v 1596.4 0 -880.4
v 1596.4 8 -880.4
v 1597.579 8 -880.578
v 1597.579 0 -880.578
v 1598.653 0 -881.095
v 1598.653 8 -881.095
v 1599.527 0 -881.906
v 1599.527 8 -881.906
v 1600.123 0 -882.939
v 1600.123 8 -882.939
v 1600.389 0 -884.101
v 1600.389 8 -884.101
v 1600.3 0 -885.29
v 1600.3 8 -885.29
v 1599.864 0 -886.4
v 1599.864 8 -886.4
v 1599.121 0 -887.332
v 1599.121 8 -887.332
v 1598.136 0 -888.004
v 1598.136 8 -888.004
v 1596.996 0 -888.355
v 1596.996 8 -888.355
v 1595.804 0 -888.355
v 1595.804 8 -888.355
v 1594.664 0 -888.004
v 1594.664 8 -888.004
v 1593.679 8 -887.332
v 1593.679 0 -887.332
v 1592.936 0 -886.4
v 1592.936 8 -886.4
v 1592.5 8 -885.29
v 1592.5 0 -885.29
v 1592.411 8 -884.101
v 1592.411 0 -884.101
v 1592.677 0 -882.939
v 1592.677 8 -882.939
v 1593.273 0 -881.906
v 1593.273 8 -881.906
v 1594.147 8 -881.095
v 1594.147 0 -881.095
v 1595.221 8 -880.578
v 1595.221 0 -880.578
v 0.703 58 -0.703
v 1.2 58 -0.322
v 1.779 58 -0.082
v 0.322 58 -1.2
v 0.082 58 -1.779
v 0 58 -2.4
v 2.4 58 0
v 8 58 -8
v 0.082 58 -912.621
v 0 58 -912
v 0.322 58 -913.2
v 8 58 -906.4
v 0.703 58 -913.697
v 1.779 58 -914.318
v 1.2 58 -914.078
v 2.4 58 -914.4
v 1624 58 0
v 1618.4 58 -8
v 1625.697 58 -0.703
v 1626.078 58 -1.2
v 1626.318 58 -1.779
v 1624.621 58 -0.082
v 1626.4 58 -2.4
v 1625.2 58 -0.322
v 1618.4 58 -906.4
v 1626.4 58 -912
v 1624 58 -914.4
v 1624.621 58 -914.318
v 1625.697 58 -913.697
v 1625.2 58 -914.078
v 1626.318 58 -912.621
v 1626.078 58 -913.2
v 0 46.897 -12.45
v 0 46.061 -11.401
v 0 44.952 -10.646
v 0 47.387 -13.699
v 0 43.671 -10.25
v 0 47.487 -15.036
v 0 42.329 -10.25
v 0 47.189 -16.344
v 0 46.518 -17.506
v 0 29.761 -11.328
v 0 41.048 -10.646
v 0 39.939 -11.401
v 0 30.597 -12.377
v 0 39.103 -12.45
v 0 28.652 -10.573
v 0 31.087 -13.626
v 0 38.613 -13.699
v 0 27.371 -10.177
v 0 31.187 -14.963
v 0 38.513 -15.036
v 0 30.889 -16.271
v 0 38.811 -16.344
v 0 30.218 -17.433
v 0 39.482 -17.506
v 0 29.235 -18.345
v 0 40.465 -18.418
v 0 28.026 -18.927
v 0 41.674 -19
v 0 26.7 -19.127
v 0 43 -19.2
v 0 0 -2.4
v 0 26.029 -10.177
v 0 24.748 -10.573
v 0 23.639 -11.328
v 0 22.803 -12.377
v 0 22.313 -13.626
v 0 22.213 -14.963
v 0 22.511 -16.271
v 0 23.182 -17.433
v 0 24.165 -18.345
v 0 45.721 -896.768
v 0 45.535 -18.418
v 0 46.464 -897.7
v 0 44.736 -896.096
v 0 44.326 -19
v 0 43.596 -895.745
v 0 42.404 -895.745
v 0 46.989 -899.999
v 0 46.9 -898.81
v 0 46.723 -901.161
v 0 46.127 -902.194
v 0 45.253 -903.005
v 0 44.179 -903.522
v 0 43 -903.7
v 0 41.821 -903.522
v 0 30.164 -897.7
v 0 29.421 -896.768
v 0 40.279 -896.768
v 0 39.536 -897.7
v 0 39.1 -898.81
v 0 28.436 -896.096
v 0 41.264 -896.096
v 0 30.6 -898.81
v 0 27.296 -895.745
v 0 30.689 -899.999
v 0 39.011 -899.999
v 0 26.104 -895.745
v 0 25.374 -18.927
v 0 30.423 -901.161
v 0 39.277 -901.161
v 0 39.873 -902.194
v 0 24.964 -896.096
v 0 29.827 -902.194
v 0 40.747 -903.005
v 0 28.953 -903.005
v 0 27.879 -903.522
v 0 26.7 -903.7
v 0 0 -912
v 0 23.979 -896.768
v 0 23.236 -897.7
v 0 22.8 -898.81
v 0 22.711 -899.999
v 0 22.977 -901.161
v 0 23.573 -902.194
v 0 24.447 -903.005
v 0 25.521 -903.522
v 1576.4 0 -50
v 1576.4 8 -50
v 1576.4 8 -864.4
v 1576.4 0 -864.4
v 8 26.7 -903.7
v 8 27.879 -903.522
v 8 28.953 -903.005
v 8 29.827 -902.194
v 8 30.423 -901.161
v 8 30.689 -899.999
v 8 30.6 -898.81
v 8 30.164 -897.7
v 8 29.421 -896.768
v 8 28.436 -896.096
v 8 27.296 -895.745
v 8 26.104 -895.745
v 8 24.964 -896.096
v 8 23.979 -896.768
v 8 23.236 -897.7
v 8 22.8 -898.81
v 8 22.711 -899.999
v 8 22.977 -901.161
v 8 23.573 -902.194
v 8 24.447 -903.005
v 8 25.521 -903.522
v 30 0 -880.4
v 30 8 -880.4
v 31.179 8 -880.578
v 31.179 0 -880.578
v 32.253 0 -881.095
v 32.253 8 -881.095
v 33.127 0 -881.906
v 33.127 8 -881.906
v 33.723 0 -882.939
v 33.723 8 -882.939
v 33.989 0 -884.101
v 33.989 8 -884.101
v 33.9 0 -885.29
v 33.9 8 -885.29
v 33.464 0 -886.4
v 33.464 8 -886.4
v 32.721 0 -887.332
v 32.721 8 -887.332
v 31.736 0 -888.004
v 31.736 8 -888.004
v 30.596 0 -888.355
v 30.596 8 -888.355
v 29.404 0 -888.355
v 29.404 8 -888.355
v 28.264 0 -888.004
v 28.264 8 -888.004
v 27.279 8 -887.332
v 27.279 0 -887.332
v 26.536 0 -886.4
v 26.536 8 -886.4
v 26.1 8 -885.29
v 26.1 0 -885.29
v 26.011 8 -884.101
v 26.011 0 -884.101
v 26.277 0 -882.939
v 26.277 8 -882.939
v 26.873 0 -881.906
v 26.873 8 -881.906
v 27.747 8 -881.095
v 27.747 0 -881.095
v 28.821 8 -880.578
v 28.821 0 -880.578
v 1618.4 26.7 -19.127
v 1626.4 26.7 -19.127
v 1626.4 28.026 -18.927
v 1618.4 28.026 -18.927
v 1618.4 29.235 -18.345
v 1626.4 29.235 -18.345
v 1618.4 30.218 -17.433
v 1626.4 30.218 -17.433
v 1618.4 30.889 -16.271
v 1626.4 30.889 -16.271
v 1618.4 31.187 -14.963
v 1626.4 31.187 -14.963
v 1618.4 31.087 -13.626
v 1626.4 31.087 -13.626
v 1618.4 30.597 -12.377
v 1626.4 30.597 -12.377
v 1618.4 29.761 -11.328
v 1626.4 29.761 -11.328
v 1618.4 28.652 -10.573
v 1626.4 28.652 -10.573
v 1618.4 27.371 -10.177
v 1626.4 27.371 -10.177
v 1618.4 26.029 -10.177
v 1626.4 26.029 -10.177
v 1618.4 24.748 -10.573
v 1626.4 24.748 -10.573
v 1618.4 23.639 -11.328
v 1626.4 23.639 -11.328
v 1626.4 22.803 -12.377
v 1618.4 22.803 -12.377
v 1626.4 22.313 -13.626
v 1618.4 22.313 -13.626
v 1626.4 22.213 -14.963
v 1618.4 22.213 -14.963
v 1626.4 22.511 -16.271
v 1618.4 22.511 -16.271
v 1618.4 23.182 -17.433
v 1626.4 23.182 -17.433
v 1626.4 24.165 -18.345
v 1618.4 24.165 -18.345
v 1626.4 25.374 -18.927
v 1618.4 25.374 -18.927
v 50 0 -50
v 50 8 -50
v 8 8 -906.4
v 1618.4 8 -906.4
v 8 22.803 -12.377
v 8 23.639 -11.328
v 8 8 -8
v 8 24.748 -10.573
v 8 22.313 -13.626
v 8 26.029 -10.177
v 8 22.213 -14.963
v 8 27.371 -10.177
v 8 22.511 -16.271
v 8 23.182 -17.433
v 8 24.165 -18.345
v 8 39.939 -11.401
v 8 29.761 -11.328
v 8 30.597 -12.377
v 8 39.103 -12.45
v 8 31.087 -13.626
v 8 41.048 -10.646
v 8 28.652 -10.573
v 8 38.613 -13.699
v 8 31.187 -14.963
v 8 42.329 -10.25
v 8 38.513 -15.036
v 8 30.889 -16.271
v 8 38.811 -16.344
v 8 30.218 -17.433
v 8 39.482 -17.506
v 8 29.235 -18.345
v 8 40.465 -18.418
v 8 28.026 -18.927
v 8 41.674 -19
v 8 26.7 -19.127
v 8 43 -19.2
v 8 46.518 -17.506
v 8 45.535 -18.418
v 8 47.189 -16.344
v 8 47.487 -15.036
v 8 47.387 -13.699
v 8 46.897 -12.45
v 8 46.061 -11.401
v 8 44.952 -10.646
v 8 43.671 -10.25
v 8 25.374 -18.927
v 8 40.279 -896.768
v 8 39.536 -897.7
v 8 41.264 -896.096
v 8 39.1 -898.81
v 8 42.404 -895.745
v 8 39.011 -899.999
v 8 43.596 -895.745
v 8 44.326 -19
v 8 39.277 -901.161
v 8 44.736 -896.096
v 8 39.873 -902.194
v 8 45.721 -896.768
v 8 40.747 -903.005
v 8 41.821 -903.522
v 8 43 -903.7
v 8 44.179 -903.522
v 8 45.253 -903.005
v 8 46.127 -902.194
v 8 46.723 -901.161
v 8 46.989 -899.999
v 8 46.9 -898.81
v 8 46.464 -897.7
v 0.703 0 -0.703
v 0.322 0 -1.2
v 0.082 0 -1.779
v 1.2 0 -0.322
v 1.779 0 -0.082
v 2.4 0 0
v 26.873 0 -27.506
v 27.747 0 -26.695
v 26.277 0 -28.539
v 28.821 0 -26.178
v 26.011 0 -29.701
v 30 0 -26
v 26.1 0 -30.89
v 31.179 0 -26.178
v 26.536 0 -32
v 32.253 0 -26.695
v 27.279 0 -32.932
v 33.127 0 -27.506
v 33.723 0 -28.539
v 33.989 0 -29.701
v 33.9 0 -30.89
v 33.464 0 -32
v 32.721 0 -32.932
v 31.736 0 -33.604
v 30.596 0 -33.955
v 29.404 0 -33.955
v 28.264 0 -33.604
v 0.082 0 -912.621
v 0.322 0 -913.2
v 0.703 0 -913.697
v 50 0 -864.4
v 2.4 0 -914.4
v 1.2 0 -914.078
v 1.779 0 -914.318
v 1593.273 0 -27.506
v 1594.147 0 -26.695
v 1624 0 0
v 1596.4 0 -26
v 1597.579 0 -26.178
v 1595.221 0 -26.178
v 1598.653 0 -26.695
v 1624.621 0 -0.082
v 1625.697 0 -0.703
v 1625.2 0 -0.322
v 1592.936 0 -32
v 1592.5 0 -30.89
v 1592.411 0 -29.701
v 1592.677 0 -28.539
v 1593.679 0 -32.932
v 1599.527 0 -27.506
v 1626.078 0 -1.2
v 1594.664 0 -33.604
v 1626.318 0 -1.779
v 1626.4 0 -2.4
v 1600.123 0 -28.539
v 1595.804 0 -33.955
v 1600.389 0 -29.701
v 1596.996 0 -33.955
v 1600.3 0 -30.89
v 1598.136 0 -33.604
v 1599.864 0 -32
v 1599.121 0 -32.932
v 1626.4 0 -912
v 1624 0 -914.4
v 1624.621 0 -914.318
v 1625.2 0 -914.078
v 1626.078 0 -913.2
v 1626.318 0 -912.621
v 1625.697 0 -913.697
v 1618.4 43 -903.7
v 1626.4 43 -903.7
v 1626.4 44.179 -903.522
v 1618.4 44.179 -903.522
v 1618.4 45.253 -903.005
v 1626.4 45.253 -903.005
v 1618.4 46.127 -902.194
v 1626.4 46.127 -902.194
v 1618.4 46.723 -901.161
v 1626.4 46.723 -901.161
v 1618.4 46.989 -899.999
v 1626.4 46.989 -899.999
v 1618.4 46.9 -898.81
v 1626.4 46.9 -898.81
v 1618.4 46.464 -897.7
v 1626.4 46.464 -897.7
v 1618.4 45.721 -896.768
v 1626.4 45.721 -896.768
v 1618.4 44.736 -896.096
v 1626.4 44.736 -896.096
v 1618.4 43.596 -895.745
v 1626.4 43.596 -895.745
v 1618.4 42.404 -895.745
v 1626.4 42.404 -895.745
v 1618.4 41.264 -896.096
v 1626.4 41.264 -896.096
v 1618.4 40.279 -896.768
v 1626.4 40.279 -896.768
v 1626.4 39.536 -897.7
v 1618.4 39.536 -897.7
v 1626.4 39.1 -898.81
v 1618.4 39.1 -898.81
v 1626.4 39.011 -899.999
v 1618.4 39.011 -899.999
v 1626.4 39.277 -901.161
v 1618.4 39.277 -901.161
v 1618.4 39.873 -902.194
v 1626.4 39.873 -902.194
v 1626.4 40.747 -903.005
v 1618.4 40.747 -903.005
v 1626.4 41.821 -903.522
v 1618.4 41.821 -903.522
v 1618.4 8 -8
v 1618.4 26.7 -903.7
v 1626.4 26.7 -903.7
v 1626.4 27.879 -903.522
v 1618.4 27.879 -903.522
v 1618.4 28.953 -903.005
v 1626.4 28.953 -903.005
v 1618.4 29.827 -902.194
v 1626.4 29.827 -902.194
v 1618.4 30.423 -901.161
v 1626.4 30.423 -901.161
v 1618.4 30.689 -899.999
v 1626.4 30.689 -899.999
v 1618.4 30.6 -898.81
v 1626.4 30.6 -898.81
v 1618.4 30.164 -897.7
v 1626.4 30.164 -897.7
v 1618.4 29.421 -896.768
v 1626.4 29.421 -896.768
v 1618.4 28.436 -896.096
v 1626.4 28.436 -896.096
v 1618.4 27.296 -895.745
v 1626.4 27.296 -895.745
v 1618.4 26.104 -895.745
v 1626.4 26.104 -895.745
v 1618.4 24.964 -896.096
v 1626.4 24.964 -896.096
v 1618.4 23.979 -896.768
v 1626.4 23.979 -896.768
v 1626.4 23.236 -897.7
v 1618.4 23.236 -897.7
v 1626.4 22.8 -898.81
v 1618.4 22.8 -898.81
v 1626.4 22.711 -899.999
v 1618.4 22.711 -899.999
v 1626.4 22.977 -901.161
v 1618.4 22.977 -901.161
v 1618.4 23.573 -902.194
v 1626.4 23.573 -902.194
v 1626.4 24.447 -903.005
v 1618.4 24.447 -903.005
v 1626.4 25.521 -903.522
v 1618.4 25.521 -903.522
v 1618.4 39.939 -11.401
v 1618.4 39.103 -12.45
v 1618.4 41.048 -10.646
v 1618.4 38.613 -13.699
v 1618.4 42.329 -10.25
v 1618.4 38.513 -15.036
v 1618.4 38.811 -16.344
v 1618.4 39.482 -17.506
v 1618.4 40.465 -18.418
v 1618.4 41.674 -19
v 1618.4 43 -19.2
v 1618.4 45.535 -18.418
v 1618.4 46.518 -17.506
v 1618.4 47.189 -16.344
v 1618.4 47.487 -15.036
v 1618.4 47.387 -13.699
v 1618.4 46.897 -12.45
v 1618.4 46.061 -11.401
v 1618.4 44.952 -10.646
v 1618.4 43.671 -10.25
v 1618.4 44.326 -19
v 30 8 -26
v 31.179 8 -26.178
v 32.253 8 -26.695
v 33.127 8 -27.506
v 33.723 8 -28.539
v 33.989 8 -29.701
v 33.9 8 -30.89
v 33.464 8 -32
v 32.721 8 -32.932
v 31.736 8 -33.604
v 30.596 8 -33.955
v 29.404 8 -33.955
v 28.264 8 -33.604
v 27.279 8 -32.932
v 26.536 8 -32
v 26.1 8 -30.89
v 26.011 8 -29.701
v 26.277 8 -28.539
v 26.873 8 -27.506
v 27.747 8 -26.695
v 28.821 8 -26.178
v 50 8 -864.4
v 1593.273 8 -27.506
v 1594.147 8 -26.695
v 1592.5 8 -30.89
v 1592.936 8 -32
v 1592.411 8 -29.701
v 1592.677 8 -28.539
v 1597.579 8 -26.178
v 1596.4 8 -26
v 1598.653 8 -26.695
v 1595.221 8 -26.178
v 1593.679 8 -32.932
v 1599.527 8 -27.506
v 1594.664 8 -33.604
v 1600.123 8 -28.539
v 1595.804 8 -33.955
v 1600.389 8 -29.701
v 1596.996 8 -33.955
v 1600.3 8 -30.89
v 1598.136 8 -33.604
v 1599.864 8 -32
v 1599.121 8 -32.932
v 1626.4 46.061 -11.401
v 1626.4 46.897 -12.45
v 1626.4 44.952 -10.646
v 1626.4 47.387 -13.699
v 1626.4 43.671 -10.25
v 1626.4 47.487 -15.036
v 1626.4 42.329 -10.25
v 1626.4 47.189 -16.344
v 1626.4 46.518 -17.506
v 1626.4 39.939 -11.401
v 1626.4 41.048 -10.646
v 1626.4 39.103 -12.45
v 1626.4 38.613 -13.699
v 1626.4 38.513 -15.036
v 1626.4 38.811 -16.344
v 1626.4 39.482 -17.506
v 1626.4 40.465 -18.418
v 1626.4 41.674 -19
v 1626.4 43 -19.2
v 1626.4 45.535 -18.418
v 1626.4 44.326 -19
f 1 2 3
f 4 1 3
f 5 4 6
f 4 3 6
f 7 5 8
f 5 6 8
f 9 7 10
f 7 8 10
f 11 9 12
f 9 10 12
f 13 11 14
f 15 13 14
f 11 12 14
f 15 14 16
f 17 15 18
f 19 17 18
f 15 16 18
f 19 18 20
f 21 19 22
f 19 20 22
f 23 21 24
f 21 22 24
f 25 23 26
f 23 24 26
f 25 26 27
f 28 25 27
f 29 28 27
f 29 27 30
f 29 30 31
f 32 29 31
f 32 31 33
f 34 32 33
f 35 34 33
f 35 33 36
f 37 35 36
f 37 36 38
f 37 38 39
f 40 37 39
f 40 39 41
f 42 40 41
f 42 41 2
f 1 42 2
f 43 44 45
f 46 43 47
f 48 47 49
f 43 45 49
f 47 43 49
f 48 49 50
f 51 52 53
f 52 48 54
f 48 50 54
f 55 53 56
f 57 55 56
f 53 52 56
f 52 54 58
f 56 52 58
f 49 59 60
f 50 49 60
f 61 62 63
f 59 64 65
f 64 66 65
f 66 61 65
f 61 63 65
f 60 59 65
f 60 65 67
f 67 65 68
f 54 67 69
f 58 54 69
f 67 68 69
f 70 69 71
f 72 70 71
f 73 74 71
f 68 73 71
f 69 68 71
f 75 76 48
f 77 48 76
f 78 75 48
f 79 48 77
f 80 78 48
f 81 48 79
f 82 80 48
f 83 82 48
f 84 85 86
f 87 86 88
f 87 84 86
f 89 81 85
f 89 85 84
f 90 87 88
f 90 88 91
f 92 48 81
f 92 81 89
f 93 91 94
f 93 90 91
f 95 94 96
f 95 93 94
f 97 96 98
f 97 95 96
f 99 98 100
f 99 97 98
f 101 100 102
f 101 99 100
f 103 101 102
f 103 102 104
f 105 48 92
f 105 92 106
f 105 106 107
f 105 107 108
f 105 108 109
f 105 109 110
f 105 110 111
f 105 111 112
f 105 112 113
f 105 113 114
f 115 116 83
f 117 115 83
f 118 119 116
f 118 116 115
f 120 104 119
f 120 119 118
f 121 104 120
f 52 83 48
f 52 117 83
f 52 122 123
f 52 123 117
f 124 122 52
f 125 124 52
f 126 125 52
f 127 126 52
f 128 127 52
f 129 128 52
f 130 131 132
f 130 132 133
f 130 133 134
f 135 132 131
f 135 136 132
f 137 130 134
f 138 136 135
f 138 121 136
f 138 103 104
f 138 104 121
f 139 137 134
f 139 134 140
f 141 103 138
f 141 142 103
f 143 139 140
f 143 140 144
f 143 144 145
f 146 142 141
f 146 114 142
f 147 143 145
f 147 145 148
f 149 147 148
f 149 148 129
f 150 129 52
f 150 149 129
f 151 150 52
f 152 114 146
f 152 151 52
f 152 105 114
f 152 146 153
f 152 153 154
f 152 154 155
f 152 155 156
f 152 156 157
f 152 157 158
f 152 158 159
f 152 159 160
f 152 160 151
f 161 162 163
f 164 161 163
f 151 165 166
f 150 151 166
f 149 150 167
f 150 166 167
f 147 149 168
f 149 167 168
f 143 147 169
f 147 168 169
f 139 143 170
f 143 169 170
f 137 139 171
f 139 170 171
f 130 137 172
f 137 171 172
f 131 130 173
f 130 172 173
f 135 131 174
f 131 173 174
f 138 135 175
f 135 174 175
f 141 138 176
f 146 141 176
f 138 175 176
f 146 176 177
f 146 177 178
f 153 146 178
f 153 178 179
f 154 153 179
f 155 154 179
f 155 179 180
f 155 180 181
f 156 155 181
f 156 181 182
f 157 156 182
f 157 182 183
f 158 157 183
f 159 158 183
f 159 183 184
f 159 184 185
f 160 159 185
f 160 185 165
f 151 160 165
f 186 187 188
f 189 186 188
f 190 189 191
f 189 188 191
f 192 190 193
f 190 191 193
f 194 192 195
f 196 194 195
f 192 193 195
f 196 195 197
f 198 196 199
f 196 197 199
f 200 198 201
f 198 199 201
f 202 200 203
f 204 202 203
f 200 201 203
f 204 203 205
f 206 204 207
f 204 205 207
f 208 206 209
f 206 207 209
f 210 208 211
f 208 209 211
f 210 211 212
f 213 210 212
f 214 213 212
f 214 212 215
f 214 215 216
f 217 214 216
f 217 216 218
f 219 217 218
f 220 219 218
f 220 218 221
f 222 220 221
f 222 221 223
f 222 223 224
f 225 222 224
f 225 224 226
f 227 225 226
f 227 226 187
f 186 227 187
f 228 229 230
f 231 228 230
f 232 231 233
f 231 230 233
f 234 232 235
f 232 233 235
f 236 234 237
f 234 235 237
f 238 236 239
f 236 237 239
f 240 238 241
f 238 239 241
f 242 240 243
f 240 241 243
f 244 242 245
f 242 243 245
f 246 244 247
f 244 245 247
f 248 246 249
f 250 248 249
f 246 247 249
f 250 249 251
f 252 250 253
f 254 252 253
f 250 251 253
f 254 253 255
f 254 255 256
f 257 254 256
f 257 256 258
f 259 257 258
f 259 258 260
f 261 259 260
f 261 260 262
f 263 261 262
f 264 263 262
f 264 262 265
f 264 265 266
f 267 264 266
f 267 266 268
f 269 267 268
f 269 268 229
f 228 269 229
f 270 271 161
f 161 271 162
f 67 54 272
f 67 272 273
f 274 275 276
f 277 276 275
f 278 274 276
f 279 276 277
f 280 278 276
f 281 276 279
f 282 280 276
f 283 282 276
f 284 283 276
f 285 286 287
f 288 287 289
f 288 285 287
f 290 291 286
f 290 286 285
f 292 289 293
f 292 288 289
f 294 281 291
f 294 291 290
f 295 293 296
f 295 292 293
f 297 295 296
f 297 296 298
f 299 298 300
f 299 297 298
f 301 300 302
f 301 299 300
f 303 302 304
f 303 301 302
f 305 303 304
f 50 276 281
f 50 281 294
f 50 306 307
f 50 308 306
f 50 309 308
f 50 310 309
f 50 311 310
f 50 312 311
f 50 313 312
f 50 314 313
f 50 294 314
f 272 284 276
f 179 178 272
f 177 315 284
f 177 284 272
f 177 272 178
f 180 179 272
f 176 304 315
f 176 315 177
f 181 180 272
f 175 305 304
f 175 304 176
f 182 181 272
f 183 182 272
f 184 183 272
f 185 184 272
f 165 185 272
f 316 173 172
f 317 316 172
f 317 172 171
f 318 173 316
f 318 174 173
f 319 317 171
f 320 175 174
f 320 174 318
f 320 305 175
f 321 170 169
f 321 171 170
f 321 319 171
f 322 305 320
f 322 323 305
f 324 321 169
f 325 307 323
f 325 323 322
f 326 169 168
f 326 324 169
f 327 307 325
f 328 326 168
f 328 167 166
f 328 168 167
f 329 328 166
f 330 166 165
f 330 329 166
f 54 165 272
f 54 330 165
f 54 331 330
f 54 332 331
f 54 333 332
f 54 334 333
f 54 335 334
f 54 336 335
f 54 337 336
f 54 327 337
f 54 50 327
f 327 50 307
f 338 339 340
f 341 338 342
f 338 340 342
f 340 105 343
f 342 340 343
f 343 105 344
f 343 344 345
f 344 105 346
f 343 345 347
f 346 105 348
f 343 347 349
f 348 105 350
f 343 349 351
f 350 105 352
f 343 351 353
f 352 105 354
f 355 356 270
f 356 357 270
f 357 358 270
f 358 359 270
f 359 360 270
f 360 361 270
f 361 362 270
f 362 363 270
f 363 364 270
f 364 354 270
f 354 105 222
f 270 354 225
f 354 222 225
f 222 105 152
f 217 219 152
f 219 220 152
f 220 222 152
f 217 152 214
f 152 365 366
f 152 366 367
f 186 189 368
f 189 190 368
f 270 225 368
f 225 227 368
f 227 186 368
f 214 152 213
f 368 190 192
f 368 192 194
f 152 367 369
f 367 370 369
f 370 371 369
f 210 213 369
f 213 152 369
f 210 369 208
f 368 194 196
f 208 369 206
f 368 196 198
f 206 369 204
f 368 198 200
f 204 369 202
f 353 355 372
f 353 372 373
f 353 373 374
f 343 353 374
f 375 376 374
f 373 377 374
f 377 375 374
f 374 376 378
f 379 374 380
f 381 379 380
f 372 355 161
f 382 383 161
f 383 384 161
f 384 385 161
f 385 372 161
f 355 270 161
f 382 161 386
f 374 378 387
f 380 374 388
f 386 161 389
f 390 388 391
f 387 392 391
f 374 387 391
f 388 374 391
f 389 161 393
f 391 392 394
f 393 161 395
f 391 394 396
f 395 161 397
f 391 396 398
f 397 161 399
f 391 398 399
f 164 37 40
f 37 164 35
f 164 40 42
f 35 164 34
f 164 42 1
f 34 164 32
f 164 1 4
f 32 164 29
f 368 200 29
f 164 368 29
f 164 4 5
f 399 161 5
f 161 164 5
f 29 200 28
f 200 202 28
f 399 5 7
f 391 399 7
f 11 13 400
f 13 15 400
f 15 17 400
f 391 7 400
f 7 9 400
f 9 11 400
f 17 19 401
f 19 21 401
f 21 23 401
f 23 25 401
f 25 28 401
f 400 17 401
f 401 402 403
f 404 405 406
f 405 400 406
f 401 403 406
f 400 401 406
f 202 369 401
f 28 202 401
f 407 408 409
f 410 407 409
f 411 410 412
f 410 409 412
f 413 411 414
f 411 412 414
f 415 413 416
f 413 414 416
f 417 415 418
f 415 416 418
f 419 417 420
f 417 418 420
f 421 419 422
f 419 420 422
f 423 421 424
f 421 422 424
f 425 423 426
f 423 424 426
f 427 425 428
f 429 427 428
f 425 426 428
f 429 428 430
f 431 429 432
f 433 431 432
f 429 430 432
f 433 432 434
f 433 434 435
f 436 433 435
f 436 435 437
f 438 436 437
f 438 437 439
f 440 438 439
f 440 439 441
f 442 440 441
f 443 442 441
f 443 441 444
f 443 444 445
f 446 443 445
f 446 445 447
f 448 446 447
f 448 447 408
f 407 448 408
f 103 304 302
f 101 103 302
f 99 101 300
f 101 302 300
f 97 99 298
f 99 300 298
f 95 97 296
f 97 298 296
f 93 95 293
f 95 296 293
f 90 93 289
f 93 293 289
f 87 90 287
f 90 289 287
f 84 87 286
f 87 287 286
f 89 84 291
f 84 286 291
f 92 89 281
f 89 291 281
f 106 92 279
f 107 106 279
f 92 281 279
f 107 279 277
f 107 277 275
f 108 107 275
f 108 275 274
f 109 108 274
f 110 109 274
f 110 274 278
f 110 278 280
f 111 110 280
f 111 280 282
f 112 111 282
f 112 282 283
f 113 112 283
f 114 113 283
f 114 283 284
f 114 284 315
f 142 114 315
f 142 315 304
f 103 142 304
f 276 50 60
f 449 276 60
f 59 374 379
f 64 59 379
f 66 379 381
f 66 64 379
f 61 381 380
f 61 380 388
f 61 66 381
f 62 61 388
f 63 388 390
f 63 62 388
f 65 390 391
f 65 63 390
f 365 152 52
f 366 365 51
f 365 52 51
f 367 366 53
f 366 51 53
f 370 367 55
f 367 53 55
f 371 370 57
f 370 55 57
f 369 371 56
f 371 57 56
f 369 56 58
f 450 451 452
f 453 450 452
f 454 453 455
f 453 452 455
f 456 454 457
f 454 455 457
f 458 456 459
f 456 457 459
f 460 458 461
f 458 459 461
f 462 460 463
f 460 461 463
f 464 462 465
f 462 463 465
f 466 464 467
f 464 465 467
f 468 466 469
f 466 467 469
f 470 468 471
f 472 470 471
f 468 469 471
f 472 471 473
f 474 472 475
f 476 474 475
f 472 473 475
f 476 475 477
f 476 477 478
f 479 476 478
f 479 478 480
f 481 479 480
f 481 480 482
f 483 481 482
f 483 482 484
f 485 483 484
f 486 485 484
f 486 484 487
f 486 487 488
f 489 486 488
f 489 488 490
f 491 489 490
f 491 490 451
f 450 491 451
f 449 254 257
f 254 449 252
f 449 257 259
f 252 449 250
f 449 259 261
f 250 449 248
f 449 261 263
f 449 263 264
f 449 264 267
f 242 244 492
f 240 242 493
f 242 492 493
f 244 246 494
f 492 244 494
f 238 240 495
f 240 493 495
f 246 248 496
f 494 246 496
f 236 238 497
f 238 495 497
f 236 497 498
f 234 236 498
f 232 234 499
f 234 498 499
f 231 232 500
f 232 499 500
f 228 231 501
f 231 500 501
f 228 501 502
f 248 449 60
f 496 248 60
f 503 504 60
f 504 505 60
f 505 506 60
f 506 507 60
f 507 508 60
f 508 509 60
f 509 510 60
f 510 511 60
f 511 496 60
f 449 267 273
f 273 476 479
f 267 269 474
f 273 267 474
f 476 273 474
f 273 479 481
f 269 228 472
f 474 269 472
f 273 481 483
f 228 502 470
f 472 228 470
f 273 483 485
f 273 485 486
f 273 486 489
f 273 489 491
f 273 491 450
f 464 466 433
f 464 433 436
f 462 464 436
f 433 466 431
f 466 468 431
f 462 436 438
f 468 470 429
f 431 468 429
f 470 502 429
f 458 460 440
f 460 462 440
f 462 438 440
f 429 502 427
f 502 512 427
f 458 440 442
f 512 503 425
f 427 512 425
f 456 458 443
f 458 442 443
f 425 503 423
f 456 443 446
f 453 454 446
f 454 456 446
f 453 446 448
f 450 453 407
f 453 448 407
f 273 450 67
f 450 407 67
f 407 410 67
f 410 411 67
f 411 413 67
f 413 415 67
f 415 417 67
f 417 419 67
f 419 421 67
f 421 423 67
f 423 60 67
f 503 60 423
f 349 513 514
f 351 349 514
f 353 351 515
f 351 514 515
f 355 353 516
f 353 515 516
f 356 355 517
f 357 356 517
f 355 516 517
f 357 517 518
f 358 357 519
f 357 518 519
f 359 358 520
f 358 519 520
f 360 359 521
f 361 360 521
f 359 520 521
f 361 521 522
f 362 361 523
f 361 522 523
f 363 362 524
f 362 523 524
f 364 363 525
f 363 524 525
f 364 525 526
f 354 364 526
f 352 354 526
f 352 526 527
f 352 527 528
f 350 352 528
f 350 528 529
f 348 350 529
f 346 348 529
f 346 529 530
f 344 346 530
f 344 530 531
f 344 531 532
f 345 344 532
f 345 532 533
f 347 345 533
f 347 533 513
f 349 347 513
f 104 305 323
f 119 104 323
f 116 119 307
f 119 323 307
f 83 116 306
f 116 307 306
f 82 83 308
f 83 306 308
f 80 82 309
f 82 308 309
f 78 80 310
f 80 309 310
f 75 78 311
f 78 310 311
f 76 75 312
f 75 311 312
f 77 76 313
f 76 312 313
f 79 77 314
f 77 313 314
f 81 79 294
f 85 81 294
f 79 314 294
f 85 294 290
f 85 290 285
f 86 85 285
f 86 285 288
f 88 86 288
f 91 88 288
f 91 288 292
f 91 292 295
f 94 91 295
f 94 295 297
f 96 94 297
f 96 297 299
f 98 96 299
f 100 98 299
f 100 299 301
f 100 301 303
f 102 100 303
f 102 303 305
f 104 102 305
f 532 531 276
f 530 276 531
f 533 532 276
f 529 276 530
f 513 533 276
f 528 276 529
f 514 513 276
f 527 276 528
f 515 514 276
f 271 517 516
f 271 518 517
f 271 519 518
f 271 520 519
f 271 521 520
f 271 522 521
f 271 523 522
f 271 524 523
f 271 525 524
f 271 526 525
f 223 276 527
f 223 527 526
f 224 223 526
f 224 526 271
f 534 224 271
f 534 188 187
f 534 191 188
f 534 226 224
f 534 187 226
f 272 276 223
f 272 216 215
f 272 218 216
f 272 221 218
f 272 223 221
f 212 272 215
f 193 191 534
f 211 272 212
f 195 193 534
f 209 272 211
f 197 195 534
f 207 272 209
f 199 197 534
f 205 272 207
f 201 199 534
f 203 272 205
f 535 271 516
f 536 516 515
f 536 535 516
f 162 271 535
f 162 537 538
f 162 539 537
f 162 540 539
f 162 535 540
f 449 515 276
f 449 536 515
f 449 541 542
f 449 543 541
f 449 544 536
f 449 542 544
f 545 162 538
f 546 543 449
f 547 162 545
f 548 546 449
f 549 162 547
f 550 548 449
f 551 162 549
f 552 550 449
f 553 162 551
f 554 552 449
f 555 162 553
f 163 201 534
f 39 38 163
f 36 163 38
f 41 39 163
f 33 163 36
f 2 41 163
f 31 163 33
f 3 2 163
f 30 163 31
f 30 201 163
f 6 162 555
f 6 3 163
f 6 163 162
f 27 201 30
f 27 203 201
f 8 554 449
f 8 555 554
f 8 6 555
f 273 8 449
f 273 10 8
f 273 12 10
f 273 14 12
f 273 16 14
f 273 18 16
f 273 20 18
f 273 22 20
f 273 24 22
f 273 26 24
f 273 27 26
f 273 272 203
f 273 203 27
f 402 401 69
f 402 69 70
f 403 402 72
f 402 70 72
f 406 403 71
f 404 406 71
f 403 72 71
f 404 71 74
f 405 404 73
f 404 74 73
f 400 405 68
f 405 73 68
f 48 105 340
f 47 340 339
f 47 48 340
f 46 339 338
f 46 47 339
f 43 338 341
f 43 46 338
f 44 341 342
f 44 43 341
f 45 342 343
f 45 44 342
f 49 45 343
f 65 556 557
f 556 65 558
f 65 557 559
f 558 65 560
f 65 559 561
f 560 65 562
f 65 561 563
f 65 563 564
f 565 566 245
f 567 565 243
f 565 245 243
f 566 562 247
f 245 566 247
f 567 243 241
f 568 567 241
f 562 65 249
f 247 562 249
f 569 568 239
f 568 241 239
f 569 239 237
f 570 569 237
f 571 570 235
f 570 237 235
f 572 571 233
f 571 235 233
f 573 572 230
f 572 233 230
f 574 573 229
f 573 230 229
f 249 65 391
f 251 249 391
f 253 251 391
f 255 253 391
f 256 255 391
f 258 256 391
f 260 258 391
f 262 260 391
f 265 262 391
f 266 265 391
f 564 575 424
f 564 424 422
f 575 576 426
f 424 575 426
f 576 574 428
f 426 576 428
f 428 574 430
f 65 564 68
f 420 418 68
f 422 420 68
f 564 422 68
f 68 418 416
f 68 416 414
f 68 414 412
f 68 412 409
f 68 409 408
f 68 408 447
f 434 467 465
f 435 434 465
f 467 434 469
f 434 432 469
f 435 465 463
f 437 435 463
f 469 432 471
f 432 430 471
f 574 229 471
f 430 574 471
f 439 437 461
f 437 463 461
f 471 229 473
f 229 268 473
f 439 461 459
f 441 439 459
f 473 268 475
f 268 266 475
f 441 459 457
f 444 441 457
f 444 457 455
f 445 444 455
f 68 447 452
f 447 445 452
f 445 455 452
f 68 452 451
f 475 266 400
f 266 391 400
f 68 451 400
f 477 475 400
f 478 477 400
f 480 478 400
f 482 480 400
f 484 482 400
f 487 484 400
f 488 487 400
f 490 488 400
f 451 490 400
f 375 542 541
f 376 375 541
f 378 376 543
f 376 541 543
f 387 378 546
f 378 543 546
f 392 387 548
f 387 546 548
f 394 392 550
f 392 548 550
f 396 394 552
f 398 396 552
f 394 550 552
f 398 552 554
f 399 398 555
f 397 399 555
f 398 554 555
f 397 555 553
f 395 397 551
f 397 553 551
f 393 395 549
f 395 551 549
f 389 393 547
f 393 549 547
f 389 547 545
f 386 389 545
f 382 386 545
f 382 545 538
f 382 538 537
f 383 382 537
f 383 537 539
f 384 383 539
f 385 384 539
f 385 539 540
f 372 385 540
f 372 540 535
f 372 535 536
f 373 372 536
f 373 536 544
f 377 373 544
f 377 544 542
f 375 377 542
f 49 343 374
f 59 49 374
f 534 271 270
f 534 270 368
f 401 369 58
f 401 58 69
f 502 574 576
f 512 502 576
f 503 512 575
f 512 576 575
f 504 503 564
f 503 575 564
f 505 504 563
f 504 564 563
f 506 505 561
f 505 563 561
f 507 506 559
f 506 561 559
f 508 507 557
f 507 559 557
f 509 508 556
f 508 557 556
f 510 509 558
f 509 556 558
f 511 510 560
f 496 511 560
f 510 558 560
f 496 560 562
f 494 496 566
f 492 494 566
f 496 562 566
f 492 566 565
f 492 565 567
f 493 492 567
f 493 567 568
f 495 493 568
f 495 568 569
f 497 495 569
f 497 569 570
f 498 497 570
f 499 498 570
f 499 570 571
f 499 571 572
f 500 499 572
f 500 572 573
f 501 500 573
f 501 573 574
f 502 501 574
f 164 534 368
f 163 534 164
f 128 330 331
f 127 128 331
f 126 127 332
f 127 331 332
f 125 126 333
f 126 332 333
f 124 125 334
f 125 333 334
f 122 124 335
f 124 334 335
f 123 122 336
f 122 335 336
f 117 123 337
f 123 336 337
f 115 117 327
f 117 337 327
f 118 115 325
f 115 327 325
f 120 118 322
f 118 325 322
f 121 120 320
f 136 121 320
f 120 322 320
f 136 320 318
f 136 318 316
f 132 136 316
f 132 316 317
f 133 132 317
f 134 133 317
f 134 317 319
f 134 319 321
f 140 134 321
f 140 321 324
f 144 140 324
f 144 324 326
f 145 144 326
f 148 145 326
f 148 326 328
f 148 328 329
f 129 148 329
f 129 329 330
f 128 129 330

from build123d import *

# Parameters (mm, degrees)
SKETCH2_W           = 1626.4
SKETCH2_H           = 914.4
BOSS_EXTRUDE1_DEPTH = 100
SHELL1_T            = -10
SKETCH3_W           = 1526.4
SKETCH3_H           = 814.4
CUT_EXTRUDE1_DEPTH  = 1868.994732327
SKETCH8_W           = 914.4
SKETCH8_H           = 42
CUT_EXTRUDE5_DEPTH  = 1869.503229861
SKETCH9_R           = 4
CUT_EXTRUDE8_DEPTH  = 1867.72663237
SKETCH10_R          = 4
CUT_EXTRUDE9_DEPTH  = 1867.442691325
SKETCH11_W          = 1610.4
SKETCH11_H          = 898.4
CUT_EXTRUDE10_DEPTH = 50
FILLET1_R           = 2.4
SKETCH13_R          = 4.5
CUT_EXTRUDE11_DEPTH = 1867.72663237


with BuildPart() as part:
    # Sketch2 → Boss-Extrude1 (new body)
    with BuildSketch(Plane(origin=(0, 0, 0), x_dir=(1, 0, 0), z_dir=(0, 1, 0))):
        with Locations((813.2, 457.2)):
            Rectangle(SKETCH2_W, SKETCH2_H)
    extrude(amount=BOSS_EXTRUDE1_DEPTH)

    # Shell1
    shell1_openings = [part.faces().sort_by_distance(p)[0] for p in [
        (813.2, 100, -457.2),
    ]]
    offset(amount=SHELL1_T, openings=shell1_openings, kind=Kind.INTERSECTION)

    # Sketch3 → Cut-Extrude1 (cut, through all)
    with BuildSketch(Plane(origin=(0, 10, 0), x_dir=(1, 0, 0), z_dir=(0, 1, 0))):
        with Locations((813.2, 457.2)):
            Rectangle(SKETCH3_W, SKETCH3_H)
    extrude(amount=-CUT_EXTRUDE1_DEPTH, mode=Mode.SUBTRACT)

    # Sketch8 → Cut-Extrude5 (cut, through all)
    with BuildSketch(Plane(origin=(1626.4, 0, 0), x_dir=(0, 0, -1), z_dir=(1, 0, 0))):
        with Locations((457.2, 79)):
            Rectangle(SKETCH8_W, SKETCH8_H)
    extrude(amount=-CUT_EXTRUDE5_DEPTH, mode=Mode.SUBTRACT)

    # Sketch9 → Cut-Extrude8 (cut, through all)
    with BuildSketch(Plane(origin=(1626.4, 0, 0), x_dir=(0, 0, -1), z_dir=(1, 0, 0))):
        with Locations((899.7, 43)):
            Circle(SKETCH9_R)
        with Locations((899.7, 26.7)):
            Circle(SKETCH9_R)
    extrude(amount=-CUT_EXTRUDE8_DEPTH, mode=Mode.SUBTRACT)

    # Sketch10 → Cut-Extrude9 (cut, through all)
    with BuildSketch(Plane(origin=(0, 10, 0), x_dir=(1, 0, 0), z_dir=(0, 1, 0))):
        with Locations(Location((30, 884.4, 0), (0, 0, 270))):
            Circle(SKETCH10_R)
        with Locations(Location((30, 30, 0), (0, 0, 270))):
            Circle(SKETCH10_R)
        with Locations(Location((1596.4, 30, 0), (0, 0, 270))):
            Circle(SKETCH10_R)
        with Locations(Location((1596.4, 884.4, 0), (0, 0, 270))):
            Circle(SKETCH10_R)
    extrude(amount=-CUT_EXTRUDE9_DEPTH, mode=Mode.SUBTRACT)

    # Sketch11 → Cut-Extrude10 (cut)
    with BuildSketch(Plane(origin=(0, 58, 0), x_dir=(1, 0, 0), z_dir=(0, 1, 0))):
        with Locations((813.2, 457.2)):
            Rectangle(SKETCH11_W, SKETCH11_H)
    extrude(amount=-CUT_EXTRUDE10_DEPTH, mode=Mode.SUBTRACT)

    # Fillet1
    fillet1_edges = [part.edges().sort_by_distance(p)[0] for p in [
        (0, 29, -914.4),
        (1626.4, 29, -914.4),
        (1626.4, 29, 0),
        (0, 29, 0),
    ]]
    fillet(fillet1_edges, radius=FILLET1_R)

    # Sketch13 → Cut-Extrude11 (cut, through all)
    with BuildSketch(Plane(origin=(1626.4, 0, 0), x_dir=(0, 0, -1), z_dir=(1, 0, 0))):
        with Locations((14.7, 43)):
            Circle(SKETCH13_R)
        with Locations((14.626959673, 26.7)):
            Circle(SKETCH13_R)
    extrude(amount=-CUT_EXTRUDE11_DEPTH, mode=Mode.SUBTRACT)


solid = part.part
